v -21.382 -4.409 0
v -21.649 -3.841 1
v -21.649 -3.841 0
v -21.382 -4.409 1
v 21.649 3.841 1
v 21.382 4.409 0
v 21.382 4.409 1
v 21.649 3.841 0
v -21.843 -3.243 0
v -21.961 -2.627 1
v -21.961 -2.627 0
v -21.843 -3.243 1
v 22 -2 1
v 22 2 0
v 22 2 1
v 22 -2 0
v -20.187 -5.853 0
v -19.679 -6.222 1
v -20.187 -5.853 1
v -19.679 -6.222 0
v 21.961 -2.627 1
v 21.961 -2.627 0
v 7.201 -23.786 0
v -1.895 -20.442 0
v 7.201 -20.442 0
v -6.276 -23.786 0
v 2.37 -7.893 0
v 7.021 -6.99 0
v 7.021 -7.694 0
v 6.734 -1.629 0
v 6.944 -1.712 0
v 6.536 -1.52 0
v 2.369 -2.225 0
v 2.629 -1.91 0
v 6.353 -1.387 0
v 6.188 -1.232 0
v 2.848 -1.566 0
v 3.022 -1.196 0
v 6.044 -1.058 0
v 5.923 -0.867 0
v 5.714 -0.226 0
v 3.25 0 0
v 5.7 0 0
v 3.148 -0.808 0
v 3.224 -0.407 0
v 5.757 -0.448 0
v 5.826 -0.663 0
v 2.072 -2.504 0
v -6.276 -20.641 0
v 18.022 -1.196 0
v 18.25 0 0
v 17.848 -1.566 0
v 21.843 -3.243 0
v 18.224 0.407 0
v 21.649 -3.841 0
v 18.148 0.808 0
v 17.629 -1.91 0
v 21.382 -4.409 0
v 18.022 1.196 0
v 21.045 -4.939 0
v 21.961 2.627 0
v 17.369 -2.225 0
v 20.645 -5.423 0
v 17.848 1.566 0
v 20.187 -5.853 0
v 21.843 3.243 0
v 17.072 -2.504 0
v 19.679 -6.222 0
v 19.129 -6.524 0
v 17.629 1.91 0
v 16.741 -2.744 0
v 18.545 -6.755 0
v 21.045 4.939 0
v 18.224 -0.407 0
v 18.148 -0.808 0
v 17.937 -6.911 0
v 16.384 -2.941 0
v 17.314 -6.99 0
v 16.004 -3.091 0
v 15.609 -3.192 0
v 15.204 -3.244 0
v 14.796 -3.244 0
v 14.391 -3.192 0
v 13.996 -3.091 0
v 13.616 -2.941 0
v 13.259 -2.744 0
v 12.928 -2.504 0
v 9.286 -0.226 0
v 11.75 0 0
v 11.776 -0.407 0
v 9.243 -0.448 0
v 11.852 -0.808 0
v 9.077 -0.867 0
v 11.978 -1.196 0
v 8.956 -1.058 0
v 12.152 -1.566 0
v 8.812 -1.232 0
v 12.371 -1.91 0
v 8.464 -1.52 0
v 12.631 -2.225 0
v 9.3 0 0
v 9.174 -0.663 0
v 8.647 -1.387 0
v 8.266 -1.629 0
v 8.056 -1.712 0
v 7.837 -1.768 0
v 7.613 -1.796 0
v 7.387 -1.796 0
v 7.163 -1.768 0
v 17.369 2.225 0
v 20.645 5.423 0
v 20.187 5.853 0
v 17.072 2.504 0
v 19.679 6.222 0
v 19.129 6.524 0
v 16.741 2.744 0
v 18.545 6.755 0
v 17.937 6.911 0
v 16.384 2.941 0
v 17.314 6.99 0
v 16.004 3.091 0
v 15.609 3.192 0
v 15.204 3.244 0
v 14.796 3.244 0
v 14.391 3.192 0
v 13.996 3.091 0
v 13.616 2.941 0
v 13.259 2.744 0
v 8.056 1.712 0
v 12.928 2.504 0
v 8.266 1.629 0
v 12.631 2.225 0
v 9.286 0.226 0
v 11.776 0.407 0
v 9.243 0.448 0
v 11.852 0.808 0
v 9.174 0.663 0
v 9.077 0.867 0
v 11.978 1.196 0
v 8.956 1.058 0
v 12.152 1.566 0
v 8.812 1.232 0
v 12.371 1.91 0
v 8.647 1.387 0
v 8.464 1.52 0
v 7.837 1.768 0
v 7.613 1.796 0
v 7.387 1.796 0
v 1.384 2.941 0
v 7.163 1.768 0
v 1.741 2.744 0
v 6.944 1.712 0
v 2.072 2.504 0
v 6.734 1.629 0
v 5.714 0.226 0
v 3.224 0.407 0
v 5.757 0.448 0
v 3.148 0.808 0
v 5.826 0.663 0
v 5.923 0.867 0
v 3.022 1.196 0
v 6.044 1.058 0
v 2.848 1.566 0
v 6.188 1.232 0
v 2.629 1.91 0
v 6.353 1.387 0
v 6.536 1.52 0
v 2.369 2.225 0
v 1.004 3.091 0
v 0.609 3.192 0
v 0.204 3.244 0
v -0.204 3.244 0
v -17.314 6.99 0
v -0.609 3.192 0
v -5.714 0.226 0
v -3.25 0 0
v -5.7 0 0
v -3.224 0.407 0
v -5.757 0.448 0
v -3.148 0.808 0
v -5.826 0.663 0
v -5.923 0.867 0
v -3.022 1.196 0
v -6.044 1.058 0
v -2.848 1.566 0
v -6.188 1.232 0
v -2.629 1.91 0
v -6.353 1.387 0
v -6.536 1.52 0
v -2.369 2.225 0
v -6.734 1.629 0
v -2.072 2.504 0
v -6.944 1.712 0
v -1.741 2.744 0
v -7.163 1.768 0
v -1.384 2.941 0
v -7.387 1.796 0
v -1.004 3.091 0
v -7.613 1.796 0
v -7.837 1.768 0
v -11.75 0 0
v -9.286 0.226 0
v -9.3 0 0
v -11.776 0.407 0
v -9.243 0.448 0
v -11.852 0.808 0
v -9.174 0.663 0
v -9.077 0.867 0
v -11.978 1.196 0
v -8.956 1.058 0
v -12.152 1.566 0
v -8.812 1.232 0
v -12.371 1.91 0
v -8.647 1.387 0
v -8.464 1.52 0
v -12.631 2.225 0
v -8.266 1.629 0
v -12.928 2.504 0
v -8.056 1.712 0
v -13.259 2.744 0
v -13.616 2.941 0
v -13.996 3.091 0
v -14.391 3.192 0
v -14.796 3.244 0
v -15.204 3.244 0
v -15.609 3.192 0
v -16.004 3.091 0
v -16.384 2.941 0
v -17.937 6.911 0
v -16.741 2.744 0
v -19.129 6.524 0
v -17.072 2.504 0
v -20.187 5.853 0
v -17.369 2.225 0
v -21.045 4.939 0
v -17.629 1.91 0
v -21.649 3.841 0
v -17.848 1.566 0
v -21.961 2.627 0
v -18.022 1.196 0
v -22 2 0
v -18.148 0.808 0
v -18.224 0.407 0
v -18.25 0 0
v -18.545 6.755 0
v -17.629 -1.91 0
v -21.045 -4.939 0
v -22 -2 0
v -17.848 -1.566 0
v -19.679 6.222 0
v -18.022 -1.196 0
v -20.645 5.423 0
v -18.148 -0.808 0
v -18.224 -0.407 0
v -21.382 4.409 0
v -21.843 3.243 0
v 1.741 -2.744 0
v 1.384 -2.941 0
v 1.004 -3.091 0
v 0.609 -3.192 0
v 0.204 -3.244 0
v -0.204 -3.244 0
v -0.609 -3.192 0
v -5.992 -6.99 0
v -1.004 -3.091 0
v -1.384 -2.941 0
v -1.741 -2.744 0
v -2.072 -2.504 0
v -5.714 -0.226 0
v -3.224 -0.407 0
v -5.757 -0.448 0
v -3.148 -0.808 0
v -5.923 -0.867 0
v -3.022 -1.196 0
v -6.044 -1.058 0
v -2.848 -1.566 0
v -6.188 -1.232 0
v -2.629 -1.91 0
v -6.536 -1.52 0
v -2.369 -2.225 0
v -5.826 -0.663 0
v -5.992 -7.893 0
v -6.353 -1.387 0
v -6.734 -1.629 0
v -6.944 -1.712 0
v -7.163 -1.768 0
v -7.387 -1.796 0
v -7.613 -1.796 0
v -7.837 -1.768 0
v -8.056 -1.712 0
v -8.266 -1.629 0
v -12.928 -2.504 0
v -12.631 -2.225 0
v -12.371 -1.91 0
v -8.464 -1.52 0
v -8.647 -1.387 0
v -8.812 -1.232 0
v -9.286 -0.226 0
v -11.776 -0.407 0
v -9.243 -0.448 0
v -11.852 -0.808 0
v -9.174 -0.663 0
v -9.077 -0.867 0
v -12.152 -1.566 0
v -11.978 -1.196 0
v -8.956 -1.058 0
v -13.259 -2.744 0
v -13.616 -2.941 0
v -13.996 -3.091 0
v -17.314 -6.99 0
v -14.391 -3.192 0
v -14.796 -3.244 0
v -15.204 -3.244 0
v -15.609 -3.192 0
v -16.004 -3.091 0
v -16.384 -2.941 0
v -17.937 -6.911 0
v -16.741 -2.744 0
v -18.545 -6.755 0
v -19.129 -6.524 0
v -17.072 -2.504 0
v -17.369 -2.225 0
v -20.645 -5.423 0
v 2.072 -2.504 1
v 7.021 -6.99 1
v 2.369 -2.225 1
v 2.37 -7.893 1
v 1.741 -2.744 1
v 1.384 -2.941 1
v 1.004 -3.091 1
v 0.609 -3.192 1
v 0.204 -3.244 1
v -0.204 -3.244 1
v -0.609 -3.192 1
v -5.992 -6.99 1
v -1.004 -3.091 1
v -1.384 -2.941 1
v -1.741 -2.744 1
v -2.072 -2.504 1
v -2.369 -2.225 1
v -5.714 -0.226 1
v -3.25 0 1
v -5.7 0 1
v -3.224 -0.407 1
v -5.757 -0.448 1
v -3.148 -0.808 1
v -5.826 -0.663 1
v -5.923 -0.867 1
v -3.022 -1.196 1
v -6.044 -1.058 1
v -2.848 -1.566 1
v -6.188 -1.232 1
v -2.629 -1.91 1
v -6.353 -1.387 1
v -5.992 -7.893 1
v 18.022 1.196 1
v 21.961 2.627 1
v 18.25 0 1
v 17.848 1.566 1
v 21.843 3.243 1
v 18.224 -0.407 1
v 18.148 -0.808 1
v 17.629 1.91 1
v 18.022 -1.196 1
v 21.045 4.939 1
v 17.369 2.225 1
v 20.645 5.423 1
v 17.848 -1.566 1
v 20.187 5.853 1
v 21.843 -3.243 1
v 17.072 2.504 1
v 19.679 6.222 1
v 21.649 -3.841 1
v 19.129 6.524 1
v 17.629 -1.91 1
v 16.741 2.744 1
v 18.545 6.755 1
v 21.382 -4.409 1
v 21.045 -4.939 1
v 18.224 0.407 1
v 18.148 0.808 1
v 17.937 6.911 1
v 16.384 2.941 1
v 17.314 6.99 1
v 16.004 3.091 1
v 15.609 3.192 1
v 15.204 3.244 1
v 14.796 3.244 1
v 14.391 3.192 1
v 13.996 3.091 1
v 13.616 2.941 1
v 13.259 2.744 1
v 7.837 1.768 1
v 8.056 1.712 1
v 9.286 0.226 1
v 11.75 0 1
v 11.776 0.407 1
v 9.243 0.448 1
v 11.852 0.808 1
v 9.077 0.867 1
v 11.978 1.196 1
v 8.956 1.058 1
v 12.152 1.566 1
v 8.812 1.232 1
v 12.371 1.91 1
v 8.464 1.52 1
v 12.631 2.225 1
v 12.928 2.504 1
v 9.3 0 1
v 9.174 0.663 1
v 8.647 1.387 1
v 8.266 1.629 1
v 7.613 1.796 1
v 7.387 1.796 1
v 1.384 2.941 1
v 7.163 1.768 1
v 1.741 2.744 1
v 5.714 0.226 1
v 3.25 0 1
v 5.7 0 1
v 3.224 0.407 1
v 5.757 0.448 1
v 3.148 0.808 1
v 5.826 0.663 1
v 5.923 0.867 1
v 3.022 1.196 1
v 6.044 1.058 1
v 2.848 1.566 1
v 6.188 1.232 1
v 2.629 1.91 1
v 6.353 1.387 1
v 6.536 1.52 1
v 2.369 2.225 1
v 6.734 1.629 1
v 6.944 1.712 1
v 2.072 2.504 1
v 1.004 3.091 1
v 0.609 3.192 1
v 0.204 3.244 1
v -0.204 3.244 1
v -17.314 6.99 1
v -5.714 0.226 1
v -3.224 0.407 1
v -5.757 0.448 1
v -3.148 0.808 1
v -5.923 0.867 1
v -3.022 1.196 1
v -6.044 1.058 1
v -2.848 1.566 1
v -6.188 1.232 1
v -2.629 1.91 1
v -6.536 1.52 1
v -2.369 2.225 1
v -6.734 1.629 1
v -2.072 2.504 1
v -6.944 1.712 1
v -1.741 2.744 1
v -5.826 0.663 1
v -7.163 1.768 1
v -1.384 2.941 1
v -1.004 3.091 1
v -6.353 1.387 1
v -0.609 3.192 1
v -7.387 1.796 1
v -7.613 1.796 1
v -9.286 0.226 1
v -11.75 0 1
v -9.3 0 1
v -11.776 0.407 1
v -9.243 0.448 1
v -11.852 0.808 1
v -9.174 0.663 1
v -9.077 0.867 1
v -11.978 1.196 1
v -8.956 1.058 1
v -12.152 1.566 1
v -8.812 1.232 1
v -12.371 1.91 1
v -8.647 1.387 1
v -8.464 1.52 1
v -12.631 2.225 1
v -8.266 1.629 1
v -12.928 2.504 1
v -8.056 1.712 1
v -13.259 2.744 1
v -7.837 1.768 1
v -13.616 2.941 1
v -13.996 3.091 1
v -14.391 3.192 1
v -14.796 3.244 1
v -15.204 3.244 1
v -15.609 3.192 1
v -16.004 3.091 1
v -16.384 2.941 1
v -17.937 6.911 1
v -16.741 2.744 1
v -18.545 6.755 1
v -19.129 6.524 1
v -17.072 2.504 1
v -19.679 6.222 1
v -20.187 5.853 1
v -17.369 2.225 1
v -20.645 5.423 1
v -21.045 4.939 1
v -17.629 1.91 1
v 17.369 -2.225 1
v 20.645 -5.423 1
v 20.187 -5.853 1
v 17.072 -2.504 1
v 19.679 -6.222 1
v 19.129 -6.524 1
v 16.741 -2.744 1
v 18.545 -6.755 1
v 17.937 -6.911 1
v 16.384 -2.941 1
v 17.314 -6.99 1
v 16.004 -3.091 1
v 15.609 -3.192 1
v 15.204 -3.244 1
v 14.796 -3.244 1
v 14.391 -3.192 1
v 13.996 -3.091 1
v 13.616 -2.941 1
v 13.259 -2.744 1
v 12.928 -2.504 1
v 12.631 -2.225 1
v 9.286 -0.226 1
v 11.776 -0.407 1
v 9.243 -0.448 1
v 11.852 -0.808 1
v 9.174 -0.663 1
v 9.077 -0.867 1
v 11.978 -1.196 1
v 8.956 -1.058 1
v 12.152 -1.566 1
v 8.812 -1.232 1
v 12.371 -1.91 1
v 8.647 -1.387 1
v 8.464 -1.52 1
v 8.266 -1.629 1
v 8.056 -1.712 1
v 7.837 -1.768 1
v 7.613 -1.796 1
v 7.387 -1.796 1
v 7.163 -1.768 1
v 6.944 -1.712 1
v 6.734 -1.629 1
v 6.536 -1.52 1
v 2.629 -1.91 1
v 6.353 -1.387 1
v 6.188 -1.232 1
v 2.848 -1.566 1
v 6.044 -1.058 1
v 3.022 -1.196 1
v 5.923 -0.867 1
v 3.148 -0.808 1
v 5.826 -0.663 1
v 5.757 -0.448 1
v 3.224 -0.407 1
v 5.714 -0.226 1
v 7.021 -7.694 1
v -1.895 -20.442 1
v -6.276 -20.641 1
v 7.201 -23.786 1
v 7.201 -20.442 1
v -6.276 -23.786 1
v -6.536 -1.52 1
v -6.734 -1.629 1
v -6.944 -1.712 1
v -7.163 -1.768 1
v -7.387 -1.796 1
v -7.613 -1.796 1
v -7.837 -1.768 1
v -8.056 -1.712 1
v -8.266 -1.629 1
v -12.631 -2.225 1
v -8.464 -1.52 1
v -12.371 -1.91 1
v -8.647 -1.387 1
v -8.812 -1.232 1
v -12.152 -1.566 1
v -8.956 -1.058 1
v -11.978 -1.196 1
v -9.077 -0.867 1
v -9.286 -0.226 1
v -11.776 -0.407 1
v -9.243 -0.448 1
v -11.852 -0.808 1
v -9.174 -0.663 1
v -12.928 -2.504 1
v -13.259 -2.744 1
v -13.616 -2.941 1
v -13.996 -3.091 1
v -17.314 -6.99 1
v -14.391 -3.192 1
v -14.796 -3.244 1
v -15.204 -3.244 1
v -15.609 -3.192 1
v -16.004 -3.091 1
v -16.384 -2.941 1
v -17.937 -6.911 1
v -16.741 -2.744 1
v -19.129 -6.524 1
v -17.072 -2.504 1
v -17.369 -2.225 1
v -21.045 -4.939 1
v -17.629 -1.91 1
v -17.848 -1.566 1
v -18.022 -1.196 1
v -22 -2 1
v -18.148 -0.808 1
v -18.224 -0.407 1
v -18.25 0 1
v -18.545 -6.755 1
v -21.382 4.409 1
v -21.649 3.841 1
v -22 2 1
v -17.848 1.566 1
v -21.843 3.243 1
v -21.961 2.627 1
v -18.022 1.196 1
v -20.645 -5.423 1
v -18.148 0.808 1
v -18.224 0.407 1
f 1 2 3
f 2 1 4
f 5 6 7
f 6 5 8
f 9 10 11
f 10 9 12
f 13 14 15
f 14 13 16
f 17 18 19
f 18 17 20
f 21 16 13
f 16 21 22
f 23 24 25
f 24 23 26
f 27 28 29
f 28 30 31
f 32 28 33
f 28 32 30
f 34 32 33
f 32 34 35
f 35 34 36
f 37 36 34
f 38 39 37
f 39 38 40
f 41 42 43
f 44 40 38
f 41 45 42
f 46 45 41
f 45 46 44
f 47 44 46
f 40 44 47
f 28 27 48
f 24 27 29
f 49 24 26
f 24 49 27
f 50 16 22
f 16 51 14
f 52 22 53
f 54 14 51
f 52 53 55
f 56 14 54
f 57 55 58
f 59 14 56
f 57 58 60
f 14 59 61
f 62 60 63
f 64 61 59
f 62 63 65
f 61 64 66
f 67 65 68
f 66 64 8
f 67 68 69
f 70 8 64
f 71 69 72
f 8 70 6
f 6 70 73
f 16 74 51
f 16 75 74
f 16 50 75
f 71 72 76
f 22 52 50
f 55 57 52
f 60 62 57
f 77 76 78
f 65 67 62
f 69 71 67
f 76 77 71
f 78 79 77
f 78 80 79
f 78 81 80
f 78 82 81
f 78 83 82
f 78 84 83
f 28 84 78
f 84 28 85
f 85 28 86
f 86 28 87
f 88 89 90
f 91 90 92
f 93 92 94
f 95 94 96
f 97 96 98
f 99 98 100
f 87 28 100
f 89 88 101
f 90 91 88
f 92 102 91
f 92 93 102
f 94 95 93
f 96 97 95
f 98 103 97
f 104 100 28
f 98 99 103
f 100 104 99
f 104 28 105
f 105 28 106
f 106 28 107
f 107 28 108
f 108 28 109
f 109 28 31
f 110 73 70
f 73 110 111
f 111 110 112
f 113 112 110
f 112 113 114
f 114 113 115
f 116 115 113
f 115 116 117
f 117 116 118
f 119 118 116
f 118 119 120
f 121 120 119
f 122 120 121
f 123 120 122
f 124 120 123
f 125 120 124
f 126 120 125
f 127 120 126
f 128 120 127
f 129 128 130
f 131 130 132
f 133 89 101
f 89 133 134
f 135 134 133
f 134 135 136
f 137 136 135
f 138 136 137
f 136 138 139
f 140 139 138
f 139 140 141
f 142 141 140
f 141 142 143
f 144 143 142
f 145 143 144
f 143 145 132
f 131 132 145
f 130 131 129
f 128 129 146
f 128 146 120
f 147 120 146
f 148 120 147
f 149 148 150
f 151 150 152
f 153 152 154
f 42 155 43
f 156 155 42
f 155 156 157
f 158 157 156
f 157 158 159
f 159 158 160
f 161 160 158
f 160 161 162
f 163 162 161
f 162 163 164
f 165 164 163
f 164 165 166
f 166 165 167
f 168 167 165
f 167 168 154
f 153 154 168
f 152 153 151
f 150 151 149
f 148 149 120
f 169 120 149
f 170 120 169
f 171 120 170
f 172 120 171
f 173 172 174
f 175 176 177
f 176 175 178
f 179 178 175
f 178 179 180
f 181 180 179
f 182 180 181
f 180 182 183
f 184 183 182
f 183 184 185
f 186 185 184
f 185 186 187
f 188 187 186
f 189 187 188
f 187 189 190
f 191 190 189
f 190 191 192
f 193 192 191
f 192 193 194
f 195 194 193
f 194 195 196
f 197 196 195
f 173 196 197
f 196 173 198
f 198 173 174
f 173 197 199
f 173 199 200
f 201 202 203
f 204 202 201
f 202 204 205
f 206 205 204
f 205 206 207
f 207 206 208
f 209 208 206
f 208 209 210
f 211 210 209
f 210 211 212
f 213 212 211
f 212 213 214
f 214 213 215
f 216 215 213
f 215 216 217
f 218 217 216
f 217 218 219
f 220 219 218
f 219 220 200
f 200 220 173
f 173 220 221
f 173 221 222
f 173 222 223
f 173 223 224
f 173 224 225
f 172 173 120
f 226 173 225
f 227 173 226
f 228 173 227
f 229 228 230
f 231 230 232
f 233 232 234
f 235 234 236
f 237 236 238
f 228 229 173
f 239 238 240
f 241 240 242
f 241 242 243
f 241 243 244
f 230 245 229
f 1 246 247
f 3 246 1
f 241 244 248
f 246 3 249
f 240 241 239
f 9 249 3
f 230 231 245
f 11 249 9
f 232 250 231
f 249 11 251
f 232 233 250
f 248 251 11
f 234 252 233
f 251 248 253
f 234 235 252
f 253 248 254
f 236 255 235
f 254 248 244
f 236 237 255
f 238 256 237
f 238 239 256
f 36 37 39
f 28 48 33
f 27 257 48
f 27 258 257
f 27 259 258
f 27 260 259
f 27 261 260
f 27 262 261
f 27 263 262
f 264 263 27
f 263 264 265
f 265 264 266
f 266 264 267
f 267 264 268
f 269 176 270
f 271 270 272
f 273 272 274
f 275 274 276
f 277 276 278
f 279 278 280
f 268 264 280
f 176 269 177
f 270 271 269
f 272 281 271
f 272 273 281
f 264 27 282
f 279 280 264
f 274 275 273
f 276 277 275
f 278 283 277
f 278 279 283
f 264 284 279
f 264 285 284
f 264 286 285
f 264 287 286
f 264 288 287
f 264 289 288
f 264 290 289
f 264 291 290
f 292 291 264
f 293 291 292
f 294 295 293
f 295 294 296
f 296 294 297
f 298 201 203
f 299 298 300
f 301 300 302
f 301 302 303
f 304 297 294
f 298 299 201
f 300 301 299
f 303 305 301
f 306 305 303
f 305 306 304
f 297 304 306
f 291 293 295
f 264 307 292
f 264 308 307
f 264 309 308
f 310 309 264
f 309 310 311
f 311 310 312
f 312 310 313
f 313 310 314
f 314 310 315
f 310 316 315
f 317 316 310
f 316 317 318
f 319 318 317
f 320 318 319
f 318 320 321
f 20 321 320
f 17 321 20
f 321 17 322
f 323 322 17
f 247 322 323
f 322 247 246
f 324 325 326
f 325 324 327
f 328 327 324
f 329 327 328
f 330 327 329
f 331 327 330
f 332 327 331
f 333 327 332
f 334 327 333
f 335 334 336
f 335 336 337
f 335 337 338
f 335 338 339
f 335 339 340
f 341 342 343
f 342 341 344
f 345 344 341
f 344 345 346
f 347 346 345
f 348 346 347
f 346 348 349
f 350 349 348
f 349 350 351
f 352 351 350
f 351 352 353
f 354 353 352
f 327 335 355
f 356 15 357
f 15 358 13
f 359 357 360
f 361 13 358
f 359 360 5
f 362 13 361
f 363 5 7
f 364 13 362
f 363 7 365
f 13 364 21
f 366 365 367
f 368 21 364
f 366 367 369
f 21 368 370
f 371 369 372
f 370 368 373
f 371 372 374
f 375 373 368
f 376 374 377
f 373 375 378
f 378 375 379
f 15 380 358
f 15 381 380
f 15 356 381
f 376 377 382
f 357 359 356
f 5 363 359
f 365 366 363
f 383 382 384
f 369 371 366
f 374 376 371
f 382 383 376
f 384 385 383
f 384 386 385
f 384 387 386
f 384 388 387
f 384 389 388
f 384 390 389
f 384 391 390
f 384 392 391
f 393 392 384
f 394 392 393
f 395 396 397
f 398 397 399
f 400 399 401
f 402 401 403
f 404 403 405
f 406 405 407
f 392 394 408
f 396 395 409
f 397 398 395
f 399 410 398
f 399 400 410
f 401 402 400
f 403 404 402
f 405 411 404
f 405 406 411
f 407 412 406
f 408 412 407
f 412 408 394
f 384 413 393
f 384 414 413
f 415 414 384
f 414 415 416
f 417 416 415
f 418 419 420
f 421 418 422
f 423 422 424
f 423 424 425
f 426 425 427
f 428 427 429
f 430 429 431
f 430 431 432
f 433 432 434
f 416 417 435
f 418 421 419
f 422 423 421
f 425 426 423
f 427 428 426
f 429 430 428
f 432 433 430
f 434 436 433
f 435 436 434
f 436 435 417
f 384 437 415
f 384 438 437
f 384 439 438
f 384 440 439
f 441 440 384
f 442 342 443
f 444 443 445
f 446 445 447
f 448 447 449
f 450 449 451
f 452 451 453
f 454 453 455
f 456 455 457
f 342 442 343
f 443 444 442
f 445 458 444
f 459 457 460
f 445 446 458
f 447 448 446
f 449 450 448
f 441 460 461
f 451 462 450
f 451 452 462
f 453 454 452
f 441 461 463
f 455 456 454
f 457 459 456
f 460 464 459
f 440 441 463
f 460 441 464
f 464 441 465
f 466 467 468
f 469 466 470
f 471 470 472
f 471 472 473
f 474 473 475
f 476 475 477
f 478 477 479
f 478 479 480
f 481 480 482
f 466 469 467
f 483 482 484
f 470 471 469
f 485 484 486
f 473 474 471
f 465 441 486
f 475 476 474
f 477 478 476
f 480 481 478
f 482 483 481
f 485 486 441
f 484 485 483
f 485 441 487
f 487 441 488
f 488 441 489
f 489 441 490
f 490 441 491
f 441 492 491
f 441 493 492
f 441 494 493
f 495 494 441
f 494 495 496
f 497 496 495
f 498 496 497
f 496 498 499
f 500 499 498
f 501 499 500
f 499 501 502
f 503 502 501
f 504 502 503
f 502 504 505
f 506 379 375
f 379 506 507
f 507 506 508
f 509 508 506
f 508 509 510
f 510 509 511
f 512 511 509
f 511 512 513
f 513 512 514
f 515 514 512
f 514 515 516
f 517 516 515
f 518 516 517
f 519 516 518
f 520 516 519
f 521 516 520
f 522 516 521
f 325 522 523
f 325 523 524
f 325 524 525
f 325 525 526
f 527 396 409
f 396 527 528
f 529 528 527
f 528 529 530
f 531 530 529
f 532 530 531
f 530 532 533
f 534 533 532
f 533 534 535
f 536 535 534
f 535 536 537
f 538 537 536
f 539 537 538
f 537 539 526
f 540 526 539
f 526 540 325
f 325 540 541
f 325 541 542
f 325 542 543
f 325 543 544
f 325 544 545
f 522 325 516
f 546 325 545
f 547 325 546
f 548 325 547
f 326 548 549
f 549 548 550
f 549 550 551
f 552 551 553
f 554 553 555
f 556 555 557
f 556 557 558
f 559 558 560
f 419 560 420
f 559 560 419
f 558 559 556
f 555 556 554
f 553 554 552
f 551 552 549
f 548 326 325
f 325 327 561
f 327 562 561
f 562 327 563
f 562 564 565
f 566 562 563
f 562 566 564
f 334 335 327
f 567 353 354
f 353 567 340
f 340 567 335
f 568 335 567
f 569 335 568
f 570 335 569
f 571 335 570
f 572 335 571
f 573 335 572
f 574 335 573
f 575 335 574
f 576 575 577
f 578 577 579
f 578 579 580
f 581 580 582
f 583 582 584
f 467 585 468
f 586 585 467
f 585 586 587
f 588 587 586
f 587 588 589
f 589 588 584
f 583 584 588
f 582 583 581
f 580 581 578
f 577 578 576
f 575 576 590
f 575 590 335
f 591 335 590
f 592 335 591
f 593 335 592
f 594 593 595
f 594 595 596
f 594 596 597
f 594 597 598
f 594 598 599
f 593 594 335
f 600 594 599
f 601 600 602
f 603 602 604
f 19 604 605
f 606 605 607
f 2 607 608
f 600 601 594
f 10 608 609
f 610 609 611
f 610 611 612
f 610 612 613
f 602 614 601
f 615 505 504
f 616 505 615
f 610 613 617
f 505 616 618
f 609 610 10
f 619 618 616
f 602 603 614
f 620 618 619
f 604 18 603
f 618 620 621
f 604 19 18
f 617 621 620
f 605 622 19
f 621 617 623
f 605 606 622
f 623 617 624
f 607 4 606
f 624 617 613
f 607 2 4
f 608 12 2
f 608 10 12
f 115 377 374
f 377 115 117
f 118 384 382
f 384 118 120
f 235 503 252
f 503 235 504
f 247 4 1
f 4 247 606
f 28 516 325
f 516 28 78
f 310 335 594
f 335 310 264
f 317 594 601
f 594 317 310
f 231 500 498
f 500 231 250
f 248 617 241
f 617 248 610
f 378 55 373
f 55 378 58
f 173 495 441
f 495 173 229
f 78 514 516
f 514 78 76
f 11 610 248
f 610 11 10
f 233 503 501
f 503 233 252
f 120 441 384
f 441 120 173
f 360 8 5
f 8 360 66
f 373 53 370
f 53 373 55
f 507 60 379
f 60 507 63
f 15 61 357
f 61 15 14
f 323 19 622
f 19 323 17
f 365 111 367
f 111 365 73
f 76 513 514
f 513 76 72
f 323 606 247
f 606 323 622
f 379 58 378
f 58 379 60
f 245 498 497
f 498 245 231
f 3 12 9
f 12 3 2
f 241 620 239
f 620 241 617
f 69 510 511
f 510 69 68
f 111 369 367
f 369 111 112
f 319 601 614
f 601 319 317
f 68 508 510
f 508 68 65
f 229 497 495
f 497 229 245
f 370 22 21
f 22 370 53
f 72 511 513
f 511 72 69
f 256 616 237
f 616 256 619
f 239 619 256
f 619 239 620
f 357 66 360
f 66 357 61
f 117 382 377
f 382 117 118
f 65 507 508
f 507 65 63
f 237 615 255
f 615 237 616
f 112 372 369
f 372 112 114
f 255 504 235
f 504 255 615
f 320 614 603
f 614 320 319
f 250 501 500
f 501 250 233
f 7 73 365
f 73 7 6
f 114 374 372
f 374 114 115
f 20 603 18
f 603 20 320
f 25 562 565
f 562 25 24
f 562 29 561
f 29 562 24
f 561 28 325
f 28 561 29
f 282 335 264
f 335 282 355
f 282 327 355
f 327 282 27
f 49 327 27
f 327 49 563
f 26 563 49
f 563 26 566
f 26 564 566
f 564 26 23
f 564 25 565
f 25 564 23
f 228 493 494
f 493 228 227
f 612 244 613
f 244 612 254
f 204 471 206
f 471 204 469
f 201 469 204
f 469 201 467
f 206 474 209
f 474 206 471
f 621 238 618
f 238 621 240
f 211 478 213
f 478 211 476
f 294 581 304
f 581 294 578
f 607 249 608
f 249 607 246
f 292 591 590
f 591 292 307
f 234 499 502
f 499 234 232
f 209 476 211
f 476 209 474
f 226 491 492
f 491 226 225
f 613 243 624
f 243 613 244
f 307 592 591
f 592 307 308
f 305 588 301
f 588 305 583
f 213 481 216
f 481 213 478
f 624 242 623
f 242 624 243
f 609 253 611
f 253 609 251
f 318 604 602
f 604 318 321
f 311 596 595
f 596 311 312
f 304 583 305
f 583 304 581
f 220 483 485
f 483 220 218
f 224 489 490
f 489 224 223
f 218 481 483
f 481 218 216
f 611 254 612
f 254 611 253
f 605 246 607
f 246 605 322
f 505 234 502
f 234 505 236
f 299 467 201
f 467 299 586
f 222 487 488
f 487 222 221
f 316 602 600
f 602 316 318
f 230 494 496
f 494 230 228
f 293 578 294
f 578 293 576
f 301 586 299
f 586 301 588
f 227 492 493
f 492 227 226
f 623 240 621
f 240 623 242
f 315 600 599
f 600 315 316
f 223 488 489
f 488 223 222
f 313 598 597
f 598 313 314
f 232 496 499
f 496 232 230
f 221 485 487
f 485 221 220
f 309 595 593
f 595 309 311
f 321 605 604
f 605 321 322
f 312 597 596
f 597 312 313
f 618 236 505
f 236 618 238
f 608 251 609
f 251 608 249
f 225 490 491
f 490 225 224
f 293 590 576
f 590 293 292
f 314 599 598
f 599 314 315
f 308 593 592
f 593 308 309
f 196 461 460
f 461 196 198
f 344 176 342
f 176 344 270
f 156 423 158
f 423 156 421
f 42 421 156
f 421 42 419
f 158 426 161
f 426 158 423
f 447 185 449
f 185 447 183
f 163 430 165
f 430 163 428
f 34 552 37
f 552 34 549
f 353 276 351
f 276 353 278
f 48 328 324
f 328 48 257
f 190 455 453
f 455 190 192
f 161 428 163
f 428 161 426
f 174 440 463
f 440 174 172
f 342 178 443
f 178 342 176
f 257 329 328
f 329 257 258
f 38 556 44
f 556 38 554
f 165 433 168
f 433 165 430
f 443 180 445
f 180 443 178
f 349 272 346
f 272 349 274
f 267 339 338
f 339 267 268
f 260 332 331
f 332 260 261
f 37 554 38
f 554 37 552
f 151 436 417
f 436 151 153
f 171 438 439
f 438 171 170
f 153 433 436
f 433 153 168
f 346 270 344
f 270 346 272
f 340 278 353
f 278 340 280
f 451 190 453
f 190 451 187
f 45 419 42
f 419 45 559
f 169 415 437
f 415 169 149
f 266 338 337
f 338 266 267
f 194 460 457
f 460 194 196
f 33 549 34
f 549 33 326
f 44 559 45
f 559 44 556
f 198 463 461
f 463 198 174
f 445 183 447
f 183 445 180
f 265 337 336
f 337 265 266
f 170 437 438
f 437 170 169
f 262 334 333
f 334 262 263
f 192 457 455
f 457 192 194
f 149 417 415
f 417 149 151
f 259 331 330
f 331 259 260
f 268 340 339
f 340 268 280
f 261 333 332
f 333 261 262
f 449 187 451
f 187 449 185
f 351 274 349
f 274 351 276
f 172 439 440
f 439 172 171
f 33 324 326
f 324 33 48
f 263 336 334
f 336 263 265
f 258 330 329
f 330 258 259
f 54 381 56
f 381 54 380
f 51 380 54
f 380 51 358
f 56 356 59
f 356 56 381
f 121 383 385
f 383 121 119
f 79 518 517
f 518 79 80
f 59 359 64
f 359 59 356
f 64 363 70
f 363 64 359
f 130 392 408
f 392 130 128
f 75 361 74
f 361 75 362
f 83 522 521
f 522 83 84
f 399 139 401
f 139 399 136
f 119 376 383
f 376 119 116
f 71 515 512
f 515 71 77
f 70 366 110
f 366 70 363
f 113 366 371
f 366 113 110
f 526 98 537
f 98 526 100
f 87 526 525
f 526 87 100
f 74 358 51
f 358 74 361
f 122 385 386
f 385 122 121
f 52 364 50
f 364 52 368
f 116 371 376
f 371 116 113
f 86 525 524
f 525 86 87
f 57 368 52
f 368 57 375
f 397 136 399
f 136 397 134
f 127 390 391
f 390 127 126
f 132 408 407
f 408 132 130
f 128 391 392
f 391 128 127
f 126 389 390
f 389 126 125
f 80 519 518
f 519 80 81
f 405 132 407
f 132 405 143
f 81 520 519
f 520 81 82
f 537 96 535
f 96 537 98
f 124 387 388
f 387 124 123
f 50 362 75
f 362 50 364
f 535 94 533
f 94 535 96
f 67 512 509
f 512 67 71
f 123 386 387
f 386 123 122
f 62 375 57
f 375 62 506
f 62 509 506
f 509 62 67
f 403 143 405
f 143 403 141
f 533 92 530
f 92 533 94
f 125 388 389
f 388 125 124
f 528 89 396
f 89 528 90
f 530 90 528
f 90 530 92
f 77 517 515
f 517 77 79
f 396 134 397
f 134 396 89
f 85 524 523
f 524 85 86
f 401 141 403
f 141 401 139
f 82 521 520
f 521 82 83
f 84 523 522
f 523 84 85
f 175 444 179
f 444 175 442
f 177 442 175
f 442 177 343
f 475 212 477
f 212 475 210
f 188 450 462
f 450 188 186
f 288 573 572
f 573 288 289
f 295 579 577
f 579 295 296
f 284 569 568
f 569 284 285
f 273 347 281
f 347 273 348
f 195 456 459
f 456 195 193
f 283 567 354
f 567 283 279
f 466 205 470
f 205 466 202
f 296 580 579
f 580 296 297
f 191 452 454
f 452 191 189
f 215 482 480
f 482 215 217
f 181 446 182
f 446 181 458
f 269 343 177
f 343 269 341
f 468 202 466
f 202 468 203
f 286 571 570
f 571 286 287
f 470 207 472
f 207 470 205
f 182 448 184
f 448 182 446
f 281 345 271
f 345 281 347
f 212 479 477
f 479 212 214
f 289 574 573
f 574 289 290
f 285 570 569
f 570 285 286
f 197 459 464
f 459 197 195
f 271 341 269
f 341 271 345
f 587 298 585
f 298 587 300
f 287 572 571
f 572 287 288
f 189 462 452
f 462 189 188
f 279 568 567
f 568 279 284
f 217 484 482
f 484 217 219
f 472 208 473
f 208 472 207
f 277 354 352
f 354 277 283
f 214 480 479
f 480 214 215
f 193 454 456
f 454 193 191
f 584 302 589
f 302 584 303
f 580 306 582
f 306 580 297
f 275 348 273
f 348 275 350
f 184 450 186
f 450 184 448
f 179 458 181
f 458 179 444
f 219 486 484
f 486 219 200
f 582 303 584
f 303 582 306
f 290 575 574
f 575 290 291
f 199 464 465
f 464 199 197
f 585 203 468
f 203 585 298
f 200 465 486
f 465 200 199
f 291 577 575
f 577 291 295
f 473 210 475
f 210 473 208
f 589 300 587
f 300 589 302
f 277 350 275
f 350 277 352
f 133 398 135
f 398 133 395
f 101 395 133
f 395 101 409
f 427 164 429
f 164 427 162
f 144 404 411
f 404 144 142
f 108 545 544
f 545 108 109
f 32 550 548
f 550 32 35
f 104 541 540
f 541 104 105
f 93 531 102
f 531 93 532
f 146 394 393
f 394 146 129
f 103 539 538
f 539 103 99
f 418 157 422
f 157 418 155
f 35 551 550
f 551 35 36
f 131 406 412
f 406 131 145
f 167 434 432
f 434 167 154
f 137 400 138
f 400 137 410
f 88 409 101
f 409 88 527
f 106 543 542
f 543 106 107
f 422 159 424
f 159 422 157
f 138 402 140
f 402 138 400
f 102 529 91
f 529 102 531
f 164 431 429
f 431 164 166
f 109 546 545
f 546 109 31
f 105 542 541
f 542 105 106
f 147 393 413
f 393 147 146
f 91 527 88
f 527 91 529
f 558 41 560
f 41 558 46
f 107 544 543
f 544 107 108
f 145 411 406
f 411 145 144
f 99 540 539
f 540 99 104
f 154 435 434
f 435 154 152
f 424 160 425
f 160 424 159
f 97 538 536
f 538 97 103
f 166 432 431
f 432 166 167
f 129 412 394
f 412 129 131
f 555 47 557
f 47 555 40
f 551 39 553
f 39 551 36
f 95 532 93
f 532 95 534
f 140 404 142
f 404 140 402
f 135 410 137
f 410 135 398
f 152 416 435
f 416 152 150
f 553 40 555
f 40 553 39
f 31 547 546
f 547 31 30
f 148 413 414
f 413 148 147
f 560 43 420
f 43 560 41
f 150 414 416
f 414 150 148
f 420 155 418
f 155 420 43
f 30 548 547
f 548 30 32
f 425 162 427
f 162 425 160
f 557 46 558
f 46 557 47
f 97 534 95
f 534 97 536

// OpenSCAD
$fn = 50;


difference() {
	union() {
		hull() {
			translate(v = [-17.0000000000, 2.0000000000, 0]) {
				cylinder(h = 1, r = 5);
			}
			translate(v = [17.0000000000, 2.0000000000, 0]) {
				cylinder(h = 1, r = 5);
			}
			translate(v = [-17.0000000000, -2.0000000000, 0]) {
				cylinder(h = 1, r = 5);
			}
			translate(v = [17.0000000000, -2.0000000000, 0]) {
				cylinder(h = 1, r = 5);
			}
		}
		translate(v = [0, -5, 0]) {
			linear_extrude(height = 1) {
				text(font = "DejaVu Sans Mono:style=Bold", halign = "center", size = 19.0000000000, text = "Z", valign = "top");
			}
		}
	}
	union() {
		translate(v = [-15.0000000000, 0.0000000000, 0]) {
			translate(v = [0, 0, -100]) {
				cylinder(h = 200, r = 3.2500000000);
			}
		}
		translate(v = [0, 0, -100]) {
			cylinder(h = 200, r = 3.2500000000);
		}
		translate(v = [15.0000000000, 0.0000000000, 0]) {
			translate(v = [0, 0, -100]) {
				cylinder(h = 200, r = 3.2500000000);
			}
		}
		translate(v = [-15.0000000000, 0.0000000000, 0]) {
			translate(v = [0, 0, -100]) {
				cylinder(h = 200, r = 1.8000000000);
			}
		}
		translate(v = [-7.5000000000, 0.0000000000, 0]) {
			translate(v = [0, 0, -100]) {
				cylinder(h = 200, r = 1.8000000000);
			}
		}
		translate(v = [0, 0, -100]) {
			cylinder(h = 200, r = 1.8000000000);
		}
		translate(v = [7.5000000000, 0.0000000000, 0]) {
			translate(v = [0, 0, -100]) {
				cylinder(h = 200, r = 1.8000000000);
			}
		}
		translate(v = [15.0000000000, 0.0000000000, 0]) {
			translate(v = [0, 0, -100]) {
				cylinder(h = 200, r = 1.8000000000);
			}
		}
	}
}
